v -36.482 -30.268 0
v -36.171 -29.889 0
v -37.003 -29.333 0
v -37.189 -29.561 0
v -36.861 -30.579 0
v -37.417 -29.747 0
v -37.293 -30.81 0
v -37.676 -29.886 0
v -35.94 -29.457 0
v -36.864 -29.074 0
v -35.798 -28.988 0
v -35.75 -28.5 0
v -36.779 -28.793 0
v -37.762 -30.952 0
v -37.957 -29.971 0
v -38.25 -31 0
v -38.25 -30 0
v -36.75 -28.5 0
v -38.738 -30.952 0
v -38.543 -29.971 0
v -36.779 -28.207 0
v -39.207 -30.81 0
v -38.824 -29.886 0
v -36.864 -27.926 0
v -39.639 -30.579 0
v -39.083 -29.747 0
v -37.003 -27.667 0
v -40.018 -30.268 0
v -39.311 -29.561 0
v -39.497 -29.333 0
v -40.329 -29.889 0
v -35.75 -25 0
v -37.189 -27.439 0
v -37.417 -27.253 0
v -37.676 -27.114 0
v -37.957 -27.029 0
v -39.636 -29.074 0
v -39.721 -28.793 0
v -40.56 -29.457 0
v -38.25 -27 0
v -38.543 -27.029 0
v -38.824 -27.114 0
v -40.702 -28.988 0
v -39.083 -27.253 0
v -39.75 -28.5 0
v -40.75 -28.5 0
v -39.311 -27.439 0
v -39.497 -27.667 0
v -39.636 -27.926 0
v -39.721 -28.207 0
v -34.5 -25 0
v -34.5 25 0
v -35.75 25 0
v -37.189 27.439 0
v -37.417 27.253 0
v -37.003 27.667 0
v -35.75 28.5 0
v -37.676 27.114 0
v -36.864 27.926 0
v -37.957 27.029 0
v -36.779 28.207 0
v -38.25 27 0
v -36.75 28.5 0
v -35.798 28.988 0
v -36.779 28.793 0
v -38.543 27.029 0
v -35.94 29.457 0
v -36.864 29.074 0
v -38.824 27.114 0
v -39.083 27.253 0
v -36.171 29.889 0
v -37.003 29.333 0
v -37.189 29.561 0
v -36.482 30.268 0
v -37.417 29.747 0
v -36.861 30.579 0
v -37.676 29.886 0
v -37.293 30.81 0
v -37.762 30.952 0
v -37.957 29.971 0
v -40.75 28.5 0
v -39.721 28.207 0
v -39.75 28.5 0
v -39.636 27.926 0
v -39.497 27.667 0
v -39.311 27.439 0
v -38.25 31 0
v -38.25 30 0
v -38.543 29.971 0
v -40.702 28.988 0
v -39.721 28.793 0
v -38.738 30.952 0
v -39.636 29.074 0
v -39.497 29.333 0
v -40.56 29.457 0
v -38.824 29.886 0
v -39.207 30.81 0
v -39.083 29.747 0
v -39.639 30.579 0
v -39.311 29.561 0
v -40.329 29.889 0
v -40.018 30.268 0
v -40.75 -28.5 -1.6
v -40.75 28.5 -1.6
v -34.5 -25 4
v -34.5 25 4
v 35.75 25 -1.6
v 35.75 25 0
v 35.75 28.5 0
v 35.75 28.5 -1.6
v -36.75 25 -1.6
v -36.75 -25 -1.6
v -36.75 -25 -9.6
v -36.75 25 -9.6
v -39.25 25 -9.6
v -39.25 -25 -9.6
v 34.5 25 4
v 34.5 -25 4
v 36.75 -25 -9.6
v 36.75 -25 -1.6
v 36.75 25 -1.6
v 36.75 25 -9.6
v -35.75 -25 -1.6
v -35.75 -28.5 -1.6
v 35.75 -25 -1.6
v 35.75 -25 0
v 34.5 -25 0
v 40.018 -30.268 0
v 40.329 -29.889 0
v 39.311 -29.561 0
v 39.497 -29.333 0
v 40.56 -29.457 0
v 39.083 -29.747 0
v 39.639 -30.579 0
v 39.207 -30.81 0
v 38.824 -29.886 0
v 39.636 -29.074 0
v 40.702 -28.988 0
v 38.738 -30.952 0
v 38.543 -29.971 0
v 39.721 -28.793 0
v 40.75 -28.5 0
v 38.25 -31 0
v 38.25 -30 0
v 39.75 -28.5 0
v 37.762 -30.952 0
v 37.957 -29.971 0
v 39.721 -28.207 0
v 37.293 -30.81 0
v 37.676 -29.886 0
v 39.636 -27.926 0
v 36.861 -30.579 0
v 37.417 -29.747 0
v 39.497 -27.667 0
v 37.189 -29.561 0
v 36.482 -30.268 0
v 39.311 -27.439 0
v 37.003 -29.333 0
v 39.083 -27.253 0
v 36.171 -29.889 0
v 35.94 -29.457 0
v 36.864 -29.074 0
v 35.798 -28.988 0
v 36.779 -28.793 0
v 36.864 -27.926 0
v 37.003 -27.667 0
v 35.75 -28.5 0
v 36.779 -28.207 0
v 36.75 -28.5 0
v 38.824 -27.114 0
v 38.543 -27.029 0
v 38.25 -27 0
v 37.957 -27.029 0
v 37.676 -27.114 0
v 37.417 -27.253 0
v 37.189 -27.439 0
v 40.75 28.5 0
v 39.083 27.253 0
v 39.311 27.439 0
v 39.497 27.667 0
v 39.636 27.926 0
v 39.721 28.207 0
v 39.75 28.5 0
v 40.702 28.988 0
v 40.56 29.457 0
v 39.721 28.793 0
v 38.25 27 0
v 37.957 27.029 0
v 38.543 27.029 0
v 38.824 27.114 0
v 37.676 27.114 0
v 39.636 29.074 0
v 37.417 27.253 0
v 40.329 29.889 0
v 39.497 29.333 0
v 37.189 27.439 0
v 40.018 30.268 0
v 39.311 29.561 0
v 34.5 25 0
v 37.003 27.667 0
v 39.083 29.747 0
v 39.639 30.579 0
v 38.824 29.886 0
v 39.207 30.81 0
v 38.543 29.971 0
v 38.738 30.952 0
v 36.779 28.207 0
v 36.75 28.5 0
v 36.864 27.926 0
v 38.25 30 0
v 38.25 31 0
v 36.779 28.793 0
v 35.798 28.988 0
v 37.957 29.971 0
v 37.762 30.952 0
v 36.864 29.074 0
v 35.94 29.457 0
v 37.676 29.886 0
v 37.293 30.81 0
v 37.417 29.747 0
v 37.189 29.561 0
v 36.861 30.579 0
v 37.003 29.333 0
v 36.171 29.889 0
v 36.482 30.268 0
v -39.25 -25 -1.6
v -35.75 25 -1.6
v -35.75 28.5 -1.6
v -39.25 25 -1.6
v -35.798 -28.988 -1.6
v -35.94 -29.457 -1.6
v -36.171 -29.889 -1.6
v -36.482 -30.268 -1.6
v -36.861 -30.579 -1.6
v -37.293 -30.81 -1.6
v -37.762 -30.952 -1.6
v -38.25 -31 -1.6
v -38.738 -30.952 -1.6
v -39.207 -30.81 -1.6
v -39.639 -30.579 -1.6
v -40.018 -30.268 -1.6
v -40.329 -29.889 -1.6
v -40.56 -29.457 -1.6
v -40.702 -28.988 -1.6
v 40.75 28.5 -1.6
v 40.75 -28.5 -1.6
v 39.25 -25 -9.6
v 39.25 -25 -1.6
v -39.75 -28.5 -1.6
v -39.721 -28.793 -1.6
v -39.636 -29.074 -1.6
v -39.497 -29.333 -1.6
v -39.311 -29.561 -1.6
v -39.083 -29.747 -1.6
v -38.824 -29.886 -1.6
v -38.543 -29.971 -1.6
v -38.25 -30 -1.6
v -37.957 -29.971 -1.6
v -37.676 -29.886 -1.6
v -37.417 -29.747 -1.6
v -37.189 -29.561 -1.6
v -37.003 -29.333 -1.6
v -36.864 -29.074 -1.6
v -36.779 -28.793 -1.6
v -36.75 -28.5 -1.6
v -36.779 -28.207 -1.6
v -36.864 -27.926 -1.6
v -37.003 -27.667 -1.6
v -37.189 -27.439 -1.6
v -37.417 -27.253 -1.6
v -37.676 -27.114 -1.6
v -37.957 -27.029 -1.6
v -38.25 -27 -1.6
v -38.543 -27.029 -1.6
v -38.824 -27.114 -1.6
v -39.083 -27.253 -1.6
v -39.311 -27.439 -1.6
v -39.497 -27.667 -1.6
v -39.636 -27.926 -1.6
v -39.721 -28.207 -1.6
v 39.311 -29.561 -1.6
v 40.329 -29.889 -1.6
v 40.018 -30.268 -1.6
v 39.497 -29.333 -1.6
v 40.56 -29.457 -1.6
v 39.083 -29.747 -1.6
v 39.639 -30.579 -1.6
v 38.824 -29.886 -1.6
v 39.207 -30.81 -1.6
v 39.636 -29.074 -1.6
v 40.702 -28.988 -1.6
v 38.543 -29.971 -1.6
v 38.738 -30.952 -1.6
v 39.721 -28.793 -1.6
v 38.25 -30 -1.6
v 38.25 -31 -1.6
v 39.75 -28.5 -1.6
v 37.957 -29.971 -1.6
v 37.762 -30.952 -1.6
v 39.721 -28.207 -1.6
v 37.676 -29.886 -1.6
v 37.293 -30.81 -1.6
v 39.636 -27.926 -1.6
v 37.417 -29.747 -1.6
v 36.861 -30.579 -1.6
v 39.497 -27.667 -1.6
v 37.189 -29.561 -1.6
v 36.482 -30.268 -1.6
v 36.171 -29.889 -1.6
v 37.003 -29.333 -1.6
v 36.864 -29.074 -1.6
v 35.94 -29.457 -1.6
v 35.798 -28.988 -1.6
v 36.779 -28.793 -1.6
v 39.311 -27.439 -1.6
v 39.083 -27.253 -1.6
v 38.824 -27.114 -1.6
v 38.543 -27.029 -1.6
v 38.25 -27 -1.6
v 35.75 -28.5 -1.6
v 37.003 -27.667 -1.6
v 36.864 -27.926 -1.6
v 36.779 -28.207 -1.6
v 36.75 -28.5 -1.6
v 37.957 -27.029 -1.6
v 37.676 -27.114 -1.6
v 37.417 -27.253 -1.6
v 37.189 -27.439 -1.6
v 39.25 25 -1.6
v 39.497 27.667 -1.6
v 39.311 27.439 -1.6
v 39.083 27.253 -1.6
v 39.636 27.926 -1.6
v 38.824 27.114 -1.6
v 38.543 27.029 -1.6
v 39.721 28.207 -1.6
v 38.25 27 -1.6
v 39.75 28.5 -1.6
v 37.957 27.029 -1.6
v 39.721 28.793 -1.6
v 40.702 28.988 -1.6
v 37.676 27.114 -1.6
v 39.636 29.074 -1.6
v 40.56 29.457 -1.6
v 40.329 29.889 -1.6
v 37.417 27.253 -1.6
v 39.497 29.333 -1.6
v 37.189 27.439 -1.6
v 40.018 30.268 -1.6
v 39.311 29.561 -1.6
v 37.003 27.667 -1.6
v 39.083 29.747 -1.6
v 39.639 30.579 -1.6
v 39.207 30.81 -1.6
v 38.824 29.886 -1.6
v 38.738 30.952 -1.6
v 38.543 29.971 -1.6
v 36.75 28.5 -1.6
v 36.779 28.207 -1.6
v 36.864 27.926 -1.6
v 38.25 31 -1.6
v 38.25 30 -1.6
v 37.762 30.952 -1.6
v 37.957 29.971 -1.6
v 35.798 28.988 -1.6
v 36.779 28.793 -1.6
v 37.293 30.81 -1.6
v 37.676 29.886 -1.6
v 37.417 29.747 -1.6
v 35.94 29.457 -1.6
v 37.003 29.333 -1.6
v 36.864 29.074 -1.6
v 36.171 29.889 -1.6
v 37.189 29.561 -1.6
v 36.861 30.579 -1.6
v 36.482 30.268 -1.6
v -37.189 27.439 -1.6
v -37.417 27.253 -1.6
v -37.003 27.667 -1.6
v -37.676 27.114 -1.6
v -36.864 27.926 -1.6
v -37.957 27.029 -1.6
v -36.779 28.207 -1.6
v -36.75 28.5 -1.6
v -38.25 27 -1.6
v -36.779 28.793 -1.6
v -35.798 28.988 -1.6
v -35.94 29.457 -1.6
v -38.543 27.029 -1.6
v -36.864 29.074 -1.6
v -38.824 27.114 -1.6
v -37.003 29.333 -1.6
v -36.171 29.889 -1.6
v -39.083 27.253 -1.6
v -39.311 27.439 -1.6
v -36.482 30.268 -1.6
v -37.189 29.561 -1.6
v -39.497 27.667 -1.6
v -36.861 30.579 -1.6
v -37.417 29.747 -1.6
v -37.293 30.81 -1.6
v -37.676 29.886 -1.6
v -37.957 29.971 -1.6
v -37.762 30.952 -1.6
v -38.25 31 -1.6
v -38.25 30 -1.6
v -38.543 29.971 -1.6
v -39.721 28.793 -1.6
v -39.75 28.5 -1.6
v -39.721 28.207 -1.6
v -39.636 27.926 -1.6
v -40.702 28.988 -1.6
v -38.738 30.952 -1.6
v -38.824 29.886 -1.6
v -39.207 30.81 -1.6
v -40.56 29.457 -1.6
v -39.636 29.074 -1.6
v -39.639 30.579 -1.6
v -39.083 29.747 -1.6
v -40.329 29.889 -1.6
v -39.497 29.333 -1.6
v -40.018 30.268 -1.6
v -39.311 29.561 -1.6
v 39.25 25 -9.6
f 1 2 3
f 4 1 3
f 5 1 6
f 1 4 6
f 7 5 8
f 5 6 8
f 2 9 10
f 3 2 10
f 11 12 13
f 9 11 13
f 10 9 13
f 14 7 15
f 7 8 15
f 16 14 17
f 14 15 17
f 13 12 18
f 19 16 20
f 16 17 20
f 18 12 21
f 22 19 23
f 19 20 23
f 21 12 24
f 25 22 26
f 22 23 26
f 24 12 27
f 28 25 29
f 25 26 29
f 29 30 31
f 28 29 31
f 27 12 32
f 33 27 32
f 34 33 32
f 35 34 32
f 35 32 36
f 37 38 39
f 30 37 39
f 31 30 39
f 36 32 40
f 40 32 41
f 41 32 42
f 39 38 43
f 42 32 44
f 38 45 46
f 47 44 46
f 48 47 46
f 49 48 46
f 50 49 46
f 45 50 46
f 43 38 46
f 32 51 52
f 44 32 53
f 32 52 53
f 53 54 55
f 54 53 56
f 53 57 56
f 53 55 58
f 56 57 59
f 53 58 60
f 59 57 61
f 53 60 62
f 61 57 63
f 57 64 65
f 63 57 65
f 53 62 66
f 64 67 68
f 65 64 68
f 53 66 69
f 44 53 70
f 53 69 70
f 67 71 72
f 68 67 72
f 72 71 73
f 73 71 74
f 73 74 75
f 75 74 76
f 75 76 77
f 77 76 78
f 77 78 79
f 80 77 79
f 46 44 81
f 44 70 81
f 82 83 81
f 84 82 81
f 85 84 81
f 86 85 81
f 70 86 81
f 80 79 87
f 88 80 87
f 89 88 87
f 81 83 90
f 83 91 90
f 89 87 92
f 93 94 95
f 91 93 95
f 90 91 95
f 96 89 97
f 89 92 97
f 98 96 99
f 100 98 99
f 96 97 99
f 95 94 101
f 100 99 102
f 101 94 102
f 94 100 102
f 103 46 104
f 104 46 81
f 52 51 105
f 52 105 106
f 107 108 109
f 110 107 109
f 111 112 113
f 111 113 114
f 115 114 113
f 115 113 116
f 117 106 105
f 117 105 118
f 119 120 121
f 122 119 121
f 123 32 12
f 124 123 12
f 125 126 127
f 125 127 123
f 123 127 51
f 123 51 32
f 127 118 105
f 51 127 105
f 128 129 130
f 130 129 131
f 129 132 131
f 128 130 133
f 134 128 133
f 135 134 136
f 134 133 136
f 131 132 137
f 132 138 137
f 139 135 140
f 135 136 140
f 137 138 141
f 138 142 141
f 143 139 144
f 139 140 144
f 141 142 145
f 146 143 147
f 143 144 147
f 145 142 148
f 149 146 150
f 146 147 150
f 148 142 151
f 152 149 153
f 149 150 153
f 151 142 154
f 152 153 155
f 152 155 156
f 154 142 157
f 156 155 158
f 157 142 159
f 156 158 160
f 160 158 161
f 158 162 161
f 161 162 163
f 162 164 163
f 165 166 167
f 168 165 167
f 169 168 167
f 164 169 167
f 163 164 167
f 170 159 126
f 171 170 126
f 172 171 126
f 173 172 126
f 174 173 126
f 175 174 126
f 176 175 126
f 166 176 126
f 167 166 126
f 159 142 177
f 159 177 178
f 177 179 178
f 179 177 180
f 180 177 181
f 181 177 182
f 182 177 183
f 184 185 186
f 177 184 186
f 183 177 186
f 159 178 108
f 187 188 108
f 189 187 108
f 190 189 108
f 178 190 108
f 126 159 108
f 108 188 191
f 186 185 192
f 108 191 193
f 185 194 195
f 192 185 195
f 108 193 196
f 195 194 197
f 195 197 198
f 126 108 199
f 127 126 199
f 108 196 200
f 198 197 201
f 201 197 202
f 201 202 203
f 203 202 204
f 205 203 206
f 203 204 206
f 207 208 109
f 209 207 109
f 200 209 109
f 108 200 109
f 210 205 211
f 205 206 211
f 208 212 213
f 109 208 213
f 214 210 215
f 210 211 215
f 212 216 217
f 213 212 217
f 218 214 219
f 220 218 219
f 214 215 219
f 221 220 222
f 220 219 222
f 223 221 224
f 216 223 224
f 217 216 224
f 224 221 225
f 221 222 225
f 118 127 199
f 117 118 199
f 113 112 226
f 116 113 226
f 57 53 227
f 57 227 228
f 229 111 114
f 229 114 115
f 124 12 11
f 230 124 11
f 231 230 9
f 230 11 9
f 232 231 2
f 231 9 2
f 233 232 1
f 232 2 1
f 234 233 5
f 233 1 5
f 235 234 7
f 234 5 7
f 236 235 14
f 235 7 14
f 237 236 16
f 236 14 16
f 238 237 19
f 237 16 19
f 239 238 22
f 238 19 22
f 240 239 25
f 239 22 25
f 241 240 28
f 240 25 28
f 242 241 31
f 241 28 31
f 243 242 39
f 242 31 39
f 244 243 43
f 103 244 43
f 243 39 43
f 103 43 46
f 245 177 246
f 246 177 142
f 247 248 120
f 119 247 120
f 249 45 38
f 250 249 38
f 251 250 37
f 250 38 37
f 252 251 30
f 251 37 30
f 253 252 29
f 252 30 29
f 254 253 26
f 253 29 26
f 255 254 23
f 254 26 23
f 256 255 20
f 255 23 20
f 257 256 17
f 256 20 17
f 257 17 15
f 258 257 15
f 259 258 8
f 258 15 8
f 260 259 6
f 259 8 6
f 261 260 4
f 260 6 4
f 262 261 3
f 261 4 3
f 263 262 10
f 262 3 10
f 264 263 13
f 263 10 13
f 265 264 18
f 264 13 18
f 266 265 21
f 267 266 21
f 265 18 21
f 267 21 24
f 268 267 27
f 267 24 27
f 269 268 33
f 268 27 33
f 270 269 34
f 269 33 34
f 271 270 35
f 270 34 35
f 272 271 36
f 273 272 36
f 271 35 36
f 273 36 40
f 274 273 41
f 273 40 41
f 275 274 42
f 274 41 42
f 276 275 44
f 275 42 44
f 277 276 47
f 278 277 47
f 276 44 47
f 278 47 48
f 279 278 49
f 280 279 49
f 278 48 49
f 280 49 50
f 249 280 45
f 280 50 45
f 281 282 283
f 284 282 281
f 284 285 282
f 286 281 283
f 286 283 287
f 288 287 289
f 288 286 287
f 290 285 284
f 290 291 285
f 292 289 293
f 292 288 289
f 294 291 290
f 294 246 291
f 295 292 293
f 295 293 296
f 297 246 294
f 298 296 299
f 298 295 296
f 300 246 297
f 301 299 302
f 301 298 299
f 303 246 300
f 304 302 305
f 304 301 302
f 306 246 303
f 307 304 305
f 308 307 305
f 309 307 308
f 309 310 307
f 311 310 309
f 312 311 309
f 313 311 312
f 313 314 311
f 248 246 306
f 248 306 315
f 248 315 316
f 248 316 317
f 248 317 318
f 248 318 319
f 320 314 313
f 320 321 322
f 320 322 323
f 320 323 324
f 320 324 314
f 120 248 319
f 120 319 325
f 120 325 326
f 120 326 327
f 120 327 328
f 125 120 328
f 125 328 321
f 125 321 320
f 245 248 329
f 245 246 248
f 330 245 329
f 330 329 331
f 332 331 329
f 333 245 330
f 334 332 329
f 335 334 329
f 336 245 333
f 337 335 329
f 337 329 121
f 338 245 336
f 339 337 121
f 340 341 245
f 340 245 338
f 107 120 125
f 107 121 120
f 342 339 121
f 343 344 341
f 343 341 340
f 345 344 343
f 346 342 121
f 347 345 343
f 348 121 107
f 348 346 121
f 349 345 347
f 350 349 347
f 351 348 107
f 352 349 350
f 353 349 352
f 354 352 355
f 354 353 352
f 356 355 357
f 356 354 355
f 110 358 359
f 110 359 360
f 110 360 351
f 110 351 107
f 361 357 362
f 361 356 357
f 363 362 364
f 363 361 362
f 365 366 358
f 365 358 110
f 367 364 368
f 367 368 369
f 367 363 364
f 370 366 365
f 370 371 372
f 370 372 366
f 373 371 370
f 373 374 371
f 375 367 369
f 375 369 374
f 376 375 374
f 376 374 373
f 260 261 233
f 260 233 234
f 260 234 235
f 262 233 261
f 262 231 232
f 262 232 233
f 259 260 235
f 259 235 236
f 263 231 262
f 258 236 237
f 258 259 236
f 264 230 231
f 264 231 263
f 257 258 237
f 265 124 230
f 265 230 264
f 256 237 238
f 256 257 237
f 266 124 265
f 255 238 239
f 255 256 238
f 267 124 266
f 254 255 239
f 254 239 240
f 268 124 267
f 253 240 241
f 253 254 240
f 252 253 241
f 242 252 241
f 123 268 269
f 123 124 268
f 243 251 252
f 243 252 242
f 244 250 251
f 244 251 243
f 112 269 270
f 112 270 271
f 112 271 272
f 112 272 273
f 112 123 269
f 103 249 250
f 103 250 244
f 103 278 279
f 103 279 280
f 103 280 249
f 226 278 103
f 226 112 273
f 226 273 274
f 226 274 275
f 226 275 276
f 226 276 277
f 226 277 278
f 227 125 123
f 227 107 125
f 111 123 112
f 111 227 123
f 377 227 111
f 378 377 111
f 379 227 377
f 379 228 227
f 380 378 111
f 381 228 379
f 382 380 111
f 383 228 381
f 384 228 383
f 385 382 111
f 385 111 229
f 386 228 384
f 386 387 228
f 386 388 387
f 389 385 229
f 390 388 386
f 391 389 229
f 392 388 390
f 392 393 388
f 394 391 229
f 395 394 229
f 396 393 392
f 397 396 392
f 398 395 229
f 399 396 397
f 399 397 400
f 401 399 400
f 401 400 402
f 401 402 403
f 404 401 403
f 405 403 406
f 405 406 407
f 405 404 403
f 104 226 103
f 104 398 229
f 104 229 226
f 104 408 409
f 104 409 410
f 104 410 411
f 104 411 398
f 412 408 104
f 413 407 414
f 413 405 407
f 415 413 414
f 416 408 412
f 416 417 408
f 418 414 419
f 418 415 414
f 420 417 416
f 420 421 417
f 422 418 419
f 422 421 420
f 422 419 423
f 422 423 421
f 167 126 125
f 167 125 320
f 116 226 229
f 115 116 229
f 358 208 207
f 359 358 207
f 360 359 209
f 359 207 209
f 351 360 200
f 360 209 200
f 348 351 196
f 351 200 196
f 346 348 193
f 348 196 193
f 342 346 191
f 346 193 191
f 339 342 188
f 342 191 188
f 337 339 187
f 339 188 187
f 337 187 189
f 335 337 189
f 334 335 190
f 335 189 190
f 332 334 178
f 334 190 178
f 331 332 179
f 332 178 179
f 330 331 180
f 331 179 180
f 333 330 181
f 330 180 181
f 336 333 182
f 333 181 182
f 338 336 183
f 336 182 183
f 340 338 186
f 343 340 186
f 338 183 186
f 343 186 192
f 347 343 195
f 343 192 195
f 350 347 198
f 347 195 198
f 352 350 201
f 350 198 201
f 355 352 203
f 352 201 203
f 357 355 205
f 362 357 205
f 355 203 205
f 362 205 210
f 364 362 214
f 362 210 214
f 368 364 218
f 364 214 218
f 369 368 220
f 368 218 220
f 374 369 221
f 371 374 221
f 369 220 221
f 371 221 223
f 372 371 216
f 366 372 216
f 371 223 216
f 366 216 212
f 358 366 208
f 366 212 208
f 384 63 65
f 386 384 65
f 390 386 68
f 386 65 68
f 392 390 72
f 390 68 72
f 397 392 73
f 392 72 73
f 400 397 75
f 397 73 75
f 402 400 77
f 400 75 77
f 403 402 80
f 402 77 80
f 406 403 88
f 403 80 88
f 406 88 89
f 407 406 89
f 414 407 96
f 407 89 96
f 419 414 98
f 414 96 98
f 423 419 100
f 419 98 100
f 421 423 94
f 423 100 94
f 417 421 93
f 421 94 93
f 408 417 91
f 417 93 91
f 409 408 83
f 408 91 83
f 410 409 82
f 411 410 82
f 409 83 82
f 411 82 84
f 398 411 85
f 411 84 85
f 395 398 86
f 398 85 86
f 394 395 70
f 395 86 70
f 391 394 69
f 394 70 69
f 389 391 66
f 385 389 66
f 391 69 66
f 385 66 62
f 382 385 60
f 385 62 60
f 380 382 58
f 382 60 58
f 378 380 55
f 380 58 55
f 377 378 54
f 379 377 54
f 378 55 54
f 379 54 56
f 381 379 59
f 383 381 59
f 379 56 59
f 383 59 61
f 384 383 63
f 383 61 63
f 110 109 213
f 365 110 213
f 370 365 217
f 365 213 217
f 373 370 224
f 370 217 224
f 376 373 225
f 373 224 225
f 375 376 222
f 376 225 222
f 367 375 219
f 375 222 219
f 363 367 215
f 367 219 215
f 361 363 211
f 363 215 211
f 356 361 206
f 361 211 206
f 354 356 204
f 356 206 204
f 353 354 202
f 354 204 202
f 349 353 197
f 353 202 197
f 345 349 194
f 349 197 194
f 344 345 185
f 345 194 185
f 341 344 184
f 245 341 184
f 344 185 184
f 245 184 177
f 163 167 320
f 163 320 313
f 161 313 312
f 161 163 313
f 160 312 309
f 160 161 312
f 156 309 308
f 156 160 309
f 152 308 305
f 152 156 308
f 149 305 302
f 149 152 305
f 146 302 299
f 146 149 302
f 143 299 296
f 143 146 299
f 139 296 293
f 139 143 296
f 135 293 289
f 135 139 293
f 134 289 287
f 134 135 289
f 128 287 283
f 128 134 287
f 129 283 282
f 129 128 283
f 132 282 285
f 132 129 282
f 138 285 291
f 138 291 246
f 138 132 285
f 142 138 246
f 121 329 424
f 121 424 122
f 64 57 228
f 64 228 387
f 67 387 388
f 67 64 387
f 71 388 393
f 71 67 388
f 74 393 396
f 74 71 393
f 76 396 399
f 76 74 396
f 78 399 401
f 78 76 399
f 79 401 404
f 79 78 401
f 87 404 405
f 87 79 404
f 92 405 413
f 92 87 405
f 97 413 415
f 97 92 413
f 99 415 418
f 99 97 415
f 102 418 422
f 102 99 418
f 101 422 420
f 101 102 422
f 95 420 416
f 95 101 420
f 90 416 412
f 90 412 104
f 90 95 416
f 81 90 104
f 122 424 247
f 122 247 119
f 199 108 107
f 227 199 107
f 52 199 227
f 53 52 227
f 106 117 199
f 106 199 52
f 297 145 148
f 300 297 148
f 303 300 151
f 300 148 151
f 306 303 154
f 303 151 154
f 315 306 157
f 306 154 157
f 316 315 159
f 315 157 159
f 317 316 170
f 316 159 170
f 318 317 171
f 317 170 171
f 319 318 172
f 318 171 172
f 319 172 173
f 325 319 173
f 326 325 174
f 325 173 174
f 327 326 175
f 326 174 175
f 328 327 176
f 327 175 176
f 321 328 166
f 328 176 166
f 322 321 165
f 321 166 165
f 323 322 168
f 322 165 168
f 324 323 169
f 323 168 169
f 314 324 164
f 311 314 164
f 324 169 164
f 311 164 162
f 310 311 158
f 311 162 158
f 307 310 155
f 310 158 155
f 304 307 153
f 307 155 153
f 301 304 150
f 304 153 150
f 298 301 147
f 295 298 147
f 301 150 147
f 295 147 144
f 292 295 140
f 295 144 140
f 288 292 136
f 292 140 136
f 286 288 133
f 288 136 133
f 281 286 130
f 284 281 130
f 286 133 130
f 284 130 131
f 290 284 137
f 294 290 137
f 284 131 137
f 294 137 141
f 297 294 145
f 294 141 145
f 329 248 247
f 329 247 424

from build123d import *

# Parameters (mm, degrees)
SKETCH1_W             = 69
SKETCH1_H             = 50
BOSS_EXTRUDE1_DEPTH   = 4
SKETCH2_W             = 81.5
SKETCH2_H             = 50
BOSS_EXTRUDE2_DEPTH   = 1.6
SKETCH4_R             = 1.5
BOSS_EXTRUDE3_DEPTH   = 1.6
BOSS_EXTRUDE3_2_DEPTH = 1.6
BOSS_EXTRUDE3_3_DEPTH = 1.6
BOSS_EXTRUDE3_4_DEPTH = 1.6
SKETCH5_W             = 2.5
SKETCH5_H             = 50
BOSS_EXTRUDE4_DEPTH   = 8


with BuildPart() as part:
    # Sketch1 → Boss-Extrude1 (new body)
    with BuildSketch(Plane.XY):
        Rectangle(SKETCH1_W, SKETCH1_H)
    extrude(amount=BOSS_EXTRUDE1_DEPTH)

    # Sketch2 → Boss-Extrude2 (add)
    with BuildSketch(Plane(origin=(0, 0, 0), x_dir=(-1, 0, 0), z_dir=(0, 0, -1))):
        Rectangle(SKETCH2_W, SKETCH2_H)
    extrude(amount=BOSS_EXTRUDE2_DEPTH)



with BuildPart() as body_2:
    # Sketch4 → Boss-Extrude3 (new body)
    with BuildSketch(Plane.XY):
        with BuildLine():
            Line((-40.75, 28.5), (-40.75, 25))
            Line((-40.75, 25), (-35.75, 25))
            Line((-35.75, 25), (-35.75, 28.5))
            ThreePointArc((-35.75, 28.5), (-38.25, 31), (-40.75, 28.5))
        make_face()
        with Locations((-38.25, 28.5)):
            Circle(SKETCH4_R, mode=Mode.SUBTRACT)
    extrude(amount=-BOSS_EXTRUDE3_DEPTH)


with BuildPart() as body_3:
    # Sketch4 → Boss-Extrude3 2 (new body)
    with BuildSketch(Plane.XY):
        with BuildLine():
            Line((-35.75, -25), (-35.75, -28.5))
            ThreePointArc((-35.75, -28.5), (-38.25, -31), (-40.75, -28.5))
            Line((-40.75, -28.5), (-40.75, -25))
            Line((-40.75, -25), (-35.75, -25))
        make_face()
        with Locations((-38.25, -28.5)):
            Circle(SKETCH4_R, mode=Mode.SUBTRACT)
    extrude(amount=-BOSS_EXTRUDE3_2_DEPTH)


with BuildPart() as body_4:
    # Sketch4 → Boss-Extrude3 3 (new body)
    with BuildSketch(Plane.XY):
        with BuildLine():
            Line((40.75, -28.5), (40.75, -25))
            Line((40.75, -25), (35.75, -25))
            Line((35.75, -25), (35.75, -28.5))
            ThreePointArc((35.75, -28.5), (38.25, -31), (40.75, -28.5))
        make_face()
        with Locations((38.25, -28.5)):
            Circle(SKETCH4_R, mode=Mode.SUBTRACT)
    extrude(amount=-BOSS_EXTRUDE3_3_DEPTH)


with BuildPart() as body_5:
    # Sketch4 → Boss-Extrude3 4 (new body)
    with BuildSketch(Plane.XY):
        with BuildLine():
            Line((35.75, 25), (35.75, 28.5))
            ThreePointArc((35.75, 28.5), (38.25, 31), (40.75, 28.5))
            Line((40.75, 28.5), (40.75, 25))
            Line((40.75, 25), (35.75, 25))
        make_face()
        with Locations((38.25, 28.5)):
            Circle(SKETCH4_R, mode=Mode.SUBTRACT)
    extrude(amount=-BOSS_EXTRUDE3_4_DEPTH)


with BuildPart() as part_1:
    add(part.part)

    add(body_2.part)  # Boss-Extrude4 merges body 2

    add(body_3.part)  # Boss-Extrude4 merges body 3

    add(body_4.part)  # Boss-Extrude4 merges body 4

    add(body_5.part)  # Boss-Extrude4 merges body 5
    # Sketch5 → Boss-Extrude4 (add)
    with BuildSketch(Plane(origin=(0, 0, -1.6), x_dir=(-1, 0, 0), z_dir=(0, 0, -1))):
        with Locations((-38, 0)):
            Rectangle(SKETCH5_W, SKETCH5_H)
        with Locations((38, 0)):
            Rectangle(SKETCH5_W, SKETCH5_H)
    extrude(amount=BOSS_EXTRUDE4_DEPTH)


solid = part_1.part
